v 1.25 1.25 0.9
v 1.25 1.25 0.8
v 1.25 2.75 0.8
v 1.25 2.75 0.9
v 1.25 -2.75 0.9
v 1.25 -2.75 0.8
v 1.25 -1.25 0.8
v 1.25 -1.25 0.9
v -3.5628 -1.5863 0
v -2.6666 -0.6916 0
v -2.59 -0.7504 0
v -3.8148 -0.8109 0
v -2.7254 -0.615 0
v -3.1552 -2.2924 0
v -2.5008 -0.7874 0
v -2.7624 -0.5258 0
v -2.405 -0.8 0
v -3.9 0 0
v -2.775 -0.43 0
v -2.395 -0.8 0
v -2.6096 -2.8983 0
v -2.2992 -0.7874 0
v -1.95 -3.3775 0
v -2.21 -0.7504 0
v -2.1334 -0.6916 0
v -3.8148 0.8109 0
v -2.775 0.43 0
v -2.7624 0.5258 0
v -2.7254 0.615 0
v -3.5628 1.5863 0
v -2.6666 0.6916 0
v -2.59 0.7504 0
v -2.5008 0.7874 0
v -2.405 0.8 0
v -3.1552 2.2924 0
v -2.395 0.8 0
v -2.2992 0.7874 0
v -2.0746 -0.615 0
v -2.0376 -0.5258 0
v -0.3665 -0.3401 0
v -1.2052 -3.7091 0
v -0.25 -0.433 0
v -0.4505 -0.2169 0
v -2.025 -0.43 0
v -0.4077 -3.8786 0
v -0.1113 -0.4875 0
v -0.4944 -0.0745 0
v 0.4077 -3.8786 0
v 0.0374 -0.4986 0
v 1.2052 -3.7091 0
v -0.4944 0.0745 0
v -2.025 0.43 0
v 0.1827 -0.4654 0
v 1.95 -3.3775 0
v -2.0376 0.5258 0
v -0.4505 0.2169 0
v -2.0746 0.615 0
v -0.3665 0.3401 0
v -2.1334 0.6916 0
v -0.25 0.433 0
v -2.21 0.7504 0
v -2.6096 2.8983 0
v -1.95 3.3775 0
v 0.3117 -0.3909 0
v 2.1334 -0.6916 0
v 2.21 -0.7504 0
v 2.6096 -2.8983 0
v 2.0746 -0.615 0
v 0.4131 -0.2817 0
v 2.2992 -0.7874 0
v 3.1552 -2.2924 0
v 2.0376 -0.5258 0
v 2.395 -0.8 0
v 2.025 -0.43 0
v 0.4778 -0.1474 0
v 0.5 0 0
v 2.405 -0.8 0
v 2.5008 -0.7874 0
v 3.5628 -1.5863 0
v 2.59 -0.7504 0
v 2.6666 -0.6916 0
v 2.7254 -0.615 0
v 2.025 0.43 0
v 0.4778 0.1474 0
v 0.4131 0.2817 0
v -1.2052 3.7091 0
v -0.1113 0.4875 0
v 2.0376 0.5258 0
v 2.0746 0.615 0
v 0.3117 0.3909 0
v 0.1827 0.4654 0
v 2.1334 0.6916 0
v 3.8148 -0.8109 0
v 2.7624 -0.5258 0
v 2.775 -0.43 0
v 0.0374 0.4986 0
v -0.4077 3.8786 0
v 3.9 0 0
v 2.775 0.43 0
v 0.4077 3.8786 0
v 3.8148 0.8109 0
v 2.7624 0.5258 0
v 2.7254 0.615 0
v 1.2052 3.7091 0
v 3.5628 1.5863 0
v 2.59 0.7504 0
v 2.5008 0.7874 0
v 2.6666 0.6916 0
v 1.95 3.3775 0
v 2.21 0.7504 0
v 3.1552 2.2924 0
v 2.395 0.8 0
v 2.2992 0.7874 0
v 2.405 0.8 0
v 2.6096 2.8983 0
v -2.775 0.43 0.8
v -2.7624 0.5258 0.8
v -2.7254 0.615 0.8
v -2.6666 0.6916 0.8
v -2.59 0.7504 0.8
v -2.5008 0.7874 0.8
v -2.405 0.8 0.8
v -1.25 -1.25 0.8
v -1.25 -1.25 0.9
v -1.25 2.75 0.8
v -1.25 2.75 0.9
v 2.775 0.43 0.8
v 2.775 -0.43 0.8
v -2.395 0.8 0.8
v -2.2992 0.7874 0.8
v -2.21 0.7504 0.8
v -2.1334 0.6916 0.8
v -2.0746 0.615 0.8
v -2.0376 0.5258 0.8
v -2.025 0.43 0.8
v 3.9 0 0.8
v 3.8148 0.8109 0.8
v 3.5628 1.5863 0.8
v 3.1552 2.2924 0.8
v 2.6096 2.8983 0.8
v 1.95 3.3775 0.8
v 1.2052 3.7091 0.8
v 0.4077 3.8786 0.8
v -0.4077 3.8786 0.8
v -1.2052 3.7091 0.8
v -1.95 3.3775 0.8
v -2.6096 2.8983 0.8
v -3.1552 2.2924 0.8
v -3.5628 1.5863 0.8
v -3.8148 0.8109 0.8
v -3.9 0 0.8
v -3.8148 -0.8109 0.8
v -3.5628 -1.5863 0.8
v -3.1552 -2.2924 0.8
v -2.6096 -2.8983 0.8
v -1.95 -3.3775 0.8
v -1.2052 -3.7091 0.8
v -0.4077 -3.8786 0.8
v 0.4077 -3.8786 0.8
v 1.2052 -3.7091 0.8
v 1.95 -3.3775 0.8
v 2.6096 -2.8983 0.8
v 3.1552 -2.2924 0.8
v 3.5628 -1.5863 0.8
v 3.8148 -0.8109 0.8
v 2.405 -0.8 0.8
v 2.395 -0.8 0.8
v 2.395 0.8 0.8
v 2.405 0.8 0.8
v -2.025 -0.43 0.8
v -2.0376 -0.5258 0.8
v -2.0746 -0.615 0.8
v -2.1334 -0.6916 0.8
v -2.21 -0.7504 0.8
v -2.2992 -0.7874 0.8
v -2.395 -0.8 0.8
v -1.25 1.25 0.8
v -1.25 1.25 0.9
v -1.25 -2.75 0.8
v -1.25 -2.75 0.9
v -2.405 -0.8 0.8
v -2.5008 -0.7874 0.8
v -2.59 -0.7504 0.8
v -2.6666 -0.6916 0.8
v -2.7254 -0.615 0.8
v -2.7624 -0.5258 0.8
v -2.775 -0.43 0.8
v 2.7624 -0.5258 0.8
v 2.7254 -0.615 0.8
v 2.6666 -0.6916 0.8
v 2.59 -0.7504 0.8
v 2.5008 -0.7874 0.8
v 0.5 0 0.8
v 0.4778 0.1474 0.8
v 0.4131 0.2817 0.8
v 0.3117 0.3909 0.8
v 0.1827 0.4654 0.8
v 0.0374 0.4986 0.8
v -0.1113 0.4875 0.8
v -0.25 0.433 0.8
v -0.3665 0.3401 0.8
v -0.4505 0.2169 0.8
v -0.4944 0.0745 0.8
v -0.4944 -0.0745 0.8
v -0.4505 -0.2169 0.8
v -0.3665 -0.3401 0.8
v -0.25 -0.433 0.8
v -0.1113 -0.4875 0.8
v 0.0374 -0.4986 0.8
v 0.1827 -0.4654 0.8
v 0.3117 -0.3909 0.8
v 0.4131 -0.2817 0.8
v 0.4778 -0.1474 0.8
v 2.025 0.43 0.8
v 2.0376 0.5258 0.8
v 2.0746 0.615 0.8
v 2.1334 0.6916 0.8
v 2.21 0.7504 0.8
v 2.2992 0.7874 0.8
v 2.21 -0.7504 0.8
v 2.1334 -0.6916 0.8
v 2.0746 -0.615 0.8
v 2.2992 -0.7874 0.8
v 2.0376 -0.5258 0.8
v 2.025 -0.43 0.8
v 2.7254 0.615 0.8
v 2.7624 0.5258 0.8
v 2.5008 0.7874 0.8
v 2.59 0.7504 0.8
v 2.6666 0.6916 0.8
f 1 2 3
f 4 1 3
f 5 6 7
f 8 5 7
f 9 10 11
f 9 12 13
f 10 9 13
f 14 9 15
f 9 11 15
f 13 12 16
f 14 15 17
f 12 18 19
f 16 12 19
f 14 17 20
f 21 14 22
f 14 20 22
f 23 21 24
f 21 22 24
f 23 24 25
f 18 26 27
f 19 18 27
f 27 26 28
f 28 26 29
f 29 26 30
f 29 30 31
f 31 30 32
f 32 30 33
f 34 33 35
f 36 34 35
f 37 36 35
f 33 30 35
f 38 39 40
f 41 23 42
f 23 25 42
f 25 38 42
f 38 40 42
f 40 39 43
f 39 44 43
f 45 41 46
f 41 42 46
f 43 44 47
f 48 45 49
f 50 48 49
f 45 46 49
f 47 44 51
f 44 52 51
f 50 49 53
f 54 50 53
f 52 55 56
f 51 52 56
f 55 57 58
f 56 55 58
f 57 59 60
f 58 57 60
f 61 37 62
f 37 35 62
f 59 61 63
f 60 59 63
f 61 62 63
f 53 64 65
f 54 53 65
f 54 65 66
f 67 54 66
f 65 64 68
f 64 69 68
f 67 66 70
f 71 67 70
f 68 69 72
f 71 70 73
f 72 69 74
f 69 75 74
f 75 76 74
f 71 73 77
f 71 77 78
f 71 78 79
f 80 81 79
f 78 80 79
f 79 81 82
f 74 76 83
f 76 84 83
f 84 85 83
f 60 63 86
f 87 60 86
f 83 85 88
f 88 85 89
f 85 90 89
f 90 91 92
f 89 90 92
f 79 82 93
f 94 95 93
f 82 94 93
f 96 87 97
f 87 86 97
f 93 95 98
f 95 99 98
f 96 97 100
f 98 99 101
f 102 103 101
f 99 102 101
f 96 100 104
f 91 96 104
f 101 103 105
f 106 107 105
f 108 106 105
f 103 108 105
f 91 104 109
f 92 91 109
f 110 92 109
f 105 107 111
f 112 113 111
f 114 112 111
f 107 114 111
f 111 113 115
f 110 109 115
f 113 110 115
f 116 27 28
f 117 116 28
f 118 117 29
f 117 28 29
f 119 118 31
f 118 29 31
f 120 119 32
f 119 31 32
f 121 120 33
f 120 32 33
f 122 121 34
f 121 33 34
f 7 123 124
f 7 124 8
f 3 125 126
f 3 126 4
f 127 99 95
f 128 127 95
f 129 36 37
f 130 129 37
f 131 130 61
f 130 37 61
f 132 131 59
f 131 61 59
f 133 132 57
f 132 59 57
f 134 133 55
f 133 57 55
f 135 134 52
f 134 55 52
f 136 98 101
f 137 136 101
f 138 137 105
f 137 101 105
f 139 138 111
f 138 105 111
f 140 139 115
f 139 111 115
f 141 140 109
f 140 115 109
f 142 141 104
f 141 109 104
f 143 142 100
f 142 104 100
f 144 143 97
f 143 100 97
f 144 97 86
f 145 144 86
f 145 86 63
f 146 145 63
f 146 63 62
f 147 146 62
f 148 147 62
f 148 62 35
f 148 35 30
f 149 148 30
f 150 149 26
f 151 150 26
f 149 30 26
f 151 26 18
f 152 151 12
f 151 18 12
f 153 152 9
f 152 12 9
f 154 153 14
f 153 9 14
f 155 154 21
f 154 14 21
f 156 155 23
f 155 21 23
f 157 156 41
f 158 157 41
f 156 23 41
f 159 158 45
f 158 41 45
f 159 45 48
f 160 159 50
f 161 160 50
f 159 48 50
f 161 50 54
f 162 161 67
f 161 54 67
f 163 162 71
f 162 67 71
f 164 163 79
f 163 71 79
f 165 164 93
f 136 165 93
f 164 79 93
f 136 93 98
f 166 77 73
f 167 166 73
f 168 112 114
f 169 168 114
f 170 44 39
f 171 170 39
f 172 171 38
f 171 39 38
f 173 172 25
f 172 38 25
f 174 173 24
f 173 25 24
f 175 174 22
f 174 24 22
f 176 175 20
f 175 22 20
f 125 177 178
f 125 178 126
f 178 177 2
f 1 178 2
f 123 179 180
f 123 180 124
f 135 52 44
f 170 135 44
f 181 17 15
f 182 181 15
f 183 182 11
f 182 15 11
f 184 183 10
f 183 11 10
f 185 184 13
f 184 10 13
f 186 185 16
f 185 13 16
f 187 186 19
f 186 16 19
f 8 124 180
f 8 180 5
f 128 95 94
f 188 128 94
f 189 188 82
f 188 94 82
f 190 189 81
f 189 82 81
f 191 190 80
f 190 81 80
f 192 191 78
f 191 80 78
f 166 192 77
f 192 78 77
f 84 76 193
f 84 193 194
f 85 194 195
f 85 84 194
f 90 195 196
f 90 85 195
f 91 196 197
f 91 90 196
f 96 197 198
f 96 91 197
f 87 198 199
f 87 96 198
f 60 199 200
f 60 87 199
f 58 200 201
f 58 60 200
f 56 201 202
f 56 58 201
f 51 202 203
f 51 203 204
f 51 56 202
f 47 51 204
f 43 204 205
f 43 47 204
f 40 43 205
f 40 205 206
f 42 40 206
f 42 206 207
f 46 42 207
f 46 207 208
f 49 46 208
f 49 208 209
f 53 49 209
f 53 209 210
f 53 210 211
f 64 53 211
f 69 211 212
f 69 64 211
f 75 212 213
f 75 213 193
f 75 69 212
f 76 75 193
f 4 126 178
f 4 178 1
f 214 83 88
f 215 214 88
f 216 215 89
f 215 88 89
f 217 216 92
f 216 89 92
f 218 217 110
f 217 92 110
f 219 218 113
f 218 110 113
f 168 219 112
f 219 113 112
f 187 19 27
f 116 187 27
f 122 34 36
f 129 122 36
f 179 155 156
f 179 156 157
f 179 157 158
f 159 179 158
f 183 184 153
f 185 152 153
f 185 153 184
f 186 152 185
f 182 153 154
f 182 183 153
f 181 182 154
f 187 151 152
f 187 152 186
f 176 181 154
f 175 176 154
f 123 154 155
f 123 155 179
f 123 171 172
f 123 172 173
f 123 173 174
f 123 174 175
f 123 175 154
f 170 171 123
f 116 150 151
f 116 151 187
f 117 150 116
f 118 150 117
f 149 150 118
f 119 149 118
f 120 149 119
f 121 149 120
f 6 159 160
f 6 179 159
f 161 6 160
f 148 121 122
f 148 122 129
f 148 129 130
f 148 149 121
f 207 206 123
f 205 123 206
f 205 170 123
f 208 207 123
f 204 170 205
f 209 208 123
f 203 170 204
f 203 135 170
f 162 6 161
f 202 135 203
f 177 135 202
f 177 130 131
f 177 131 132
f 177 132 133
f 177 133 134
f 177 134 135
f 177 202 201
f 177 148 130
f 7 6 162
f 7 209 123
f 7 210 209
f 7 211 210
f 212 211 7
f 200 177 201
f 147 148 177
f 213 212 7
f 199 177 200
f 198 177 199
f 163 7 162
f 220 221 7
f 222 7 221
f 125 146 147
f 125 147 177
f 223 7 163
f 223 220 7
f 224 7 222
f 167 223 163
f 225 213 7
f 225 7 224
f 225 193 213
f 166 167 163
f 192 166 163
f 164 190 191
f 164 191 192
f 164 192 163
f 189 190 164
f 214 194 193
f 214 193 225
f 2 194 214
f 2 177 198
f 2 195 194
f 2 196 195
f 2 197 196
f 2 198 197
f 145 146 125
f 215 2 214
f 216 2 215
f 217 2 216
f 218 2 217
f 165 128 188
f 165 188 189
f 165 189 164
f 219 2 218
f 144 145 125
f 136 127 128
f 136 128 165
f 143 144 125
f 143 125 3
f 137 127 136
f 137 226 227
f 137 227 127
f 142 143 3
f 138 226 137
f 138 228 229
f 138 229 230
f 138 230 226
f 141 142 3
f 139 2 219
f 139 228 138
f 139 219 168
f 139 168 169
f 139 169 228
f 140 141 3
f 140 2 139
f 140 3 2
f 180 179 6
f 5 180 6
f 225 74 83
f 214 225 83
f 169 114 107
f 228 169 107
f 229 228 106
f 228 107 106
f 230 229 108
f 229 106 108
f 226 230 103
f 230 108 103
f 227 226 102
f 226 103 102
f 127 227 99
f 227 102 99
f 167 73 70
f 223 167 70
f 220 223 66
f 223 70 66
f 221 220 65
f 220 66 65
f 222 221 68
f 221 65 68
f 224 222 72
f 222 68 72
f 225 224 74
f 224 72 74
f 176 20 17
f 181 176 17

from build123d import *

# Parameters (mm, degrees)
SKETCH_1_R      = 3.9
SKETCH_1_R_2    = 0.5
EXTRUDE_1_DEPTH = 0.8
SKETCH_2_W      = 2.5
SKETCH_2_H      = 1.5
EXTRUDE_2_DEPTH = 0.1


with BuildPart() as part:
    # 草图1 → 凸台-拉伸1 (new body)
    with BuildSketch(Plane.XY):
        Circle(SKETCH_1_R)
        Circle(SKETCH_1_R_2, mode=Mode.SUBTRACT)
        with BuildLine():
            Line((-2.405, 0.8), (-2.395, 0.8))
            ThreePointArc((-2.395, 0.8), (-2.133370491, 0.691629509), (-2.025, 0.43))
            Line((-2.025, 0.43), (-2.025, -0.43))
            ThreePointArc((-2.025, -0.43), (-2.133370491, -0.691629509), (-2.395, -0.8))
            Line((-2.395, -0.8), (-2.405, -0.8))
            ThreePointArc((-2.405, -0.8), (-2.666629509, -0.691629509), (-2.775, -0.43))
            Line((-2.775, -0.43), (-2.775, 0.43))
            ThreePointArc((-2.775, 0.43), (-2.666629509, 0.691629509), (-2.405, 0.8))
        make_face(mode=Mode.SUBTRACT)
        with BuildLine():
            Line((2.395, 0.8), (2.405, 0.8))
            ThreePointArc((2.405, 0.8), (2.666629509, 0.691629509), (2.775, 0.43))
            Line((2.775, 0.43), (2.775, -0.43))
            ThreePointArc((2.775, -0.43), (2.666629509, -0.691629509), (2.405, -0.8))
            Line((2.405, -0.8), (2.395, -0.8))
            ThreePointArc((2.395, -0.8), (2.133370491, -0.691629509), (2.025, -0.43))
            Line((2.025, -0.43), (2.025, 0.43))
            ThreePointArc((2.025, 0.43), (2.133370491, 0.691629509), (2.395, 0.8))
        make_face(mode=Mode.SUBTRACT)
    extrude(amount=EXTRUDE_1_DEPTH)

    # 草图2 → 凸台-拉伸2 (add)
    with BuildSketch(Plane.XY.offset(0.8)):
        with Locations((0, 2)):
            Rectangle(SKETCH_2_W, SKETCH_2_H)
        with Locations((0, -2)):
            Rectangle(SKETCH_2_W, SKETCH_2_H)
    extrude(amount=EXTRUDE_2_DEPTH)


solid = part.part
